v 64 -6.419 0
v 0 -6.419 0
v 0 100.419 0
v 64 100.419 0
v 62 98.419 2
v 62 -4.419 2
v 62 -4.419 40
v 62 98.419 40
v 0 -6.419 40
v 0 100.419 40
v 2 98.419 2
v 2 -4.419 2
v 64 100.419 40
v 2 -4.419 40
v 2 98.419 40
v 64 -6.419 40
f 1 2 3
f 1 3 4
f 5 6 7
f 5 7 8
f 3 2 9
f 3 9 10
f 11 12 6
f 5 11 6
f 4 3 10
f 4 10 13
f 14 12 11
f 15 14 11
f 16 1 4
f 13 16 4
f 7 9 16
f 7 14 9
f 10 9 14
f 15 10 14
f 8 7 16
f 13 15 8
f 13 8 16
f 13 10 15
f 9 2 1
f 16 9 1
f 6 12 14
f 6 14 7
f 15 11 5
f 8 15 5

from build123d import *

# Parameters (mm, degrees)
SKETCH1_W           = 64
SKETCH1_H           = 106.838
BOSS_EXTRUDE1_DEPTH = 2
SKETCH1_3_W         = 64
SKETCH1_3_H         = 106.838
SKETCH1_3_W_2       = 60
SKETCH1_3_H_2       = 102.838
BOSS_EXTRUDE2_DEPTH = 40


with BuildPart() as part:
    # Sketch1 → Boss-Extrude1 (new body)
    with BuildSketch(Plane.XY):
        with Locations((32, 47)):
            Rectangle(SKETCH1_W, SKETCH1_H)
    extrude(amount=BOSS_EXTRUDE1_DEPTH)

    # Sketch1<3> → Boss-Extrude2 (add)
    with BuildSketch(Plane.XY):
        with Locations((32, 47)):
            Rectangle(SKETCH1_3_W, SKETCH1_3_H)
        with Locations((32, 47)):
            Rectangle(SKETCH1_3_W_2, SKETCH1_3_H_2, mode=Mode.SUBTRACT)
    extrude(amount=BOSS_EXTRUDE2_DEPTH)


solid = part.part
